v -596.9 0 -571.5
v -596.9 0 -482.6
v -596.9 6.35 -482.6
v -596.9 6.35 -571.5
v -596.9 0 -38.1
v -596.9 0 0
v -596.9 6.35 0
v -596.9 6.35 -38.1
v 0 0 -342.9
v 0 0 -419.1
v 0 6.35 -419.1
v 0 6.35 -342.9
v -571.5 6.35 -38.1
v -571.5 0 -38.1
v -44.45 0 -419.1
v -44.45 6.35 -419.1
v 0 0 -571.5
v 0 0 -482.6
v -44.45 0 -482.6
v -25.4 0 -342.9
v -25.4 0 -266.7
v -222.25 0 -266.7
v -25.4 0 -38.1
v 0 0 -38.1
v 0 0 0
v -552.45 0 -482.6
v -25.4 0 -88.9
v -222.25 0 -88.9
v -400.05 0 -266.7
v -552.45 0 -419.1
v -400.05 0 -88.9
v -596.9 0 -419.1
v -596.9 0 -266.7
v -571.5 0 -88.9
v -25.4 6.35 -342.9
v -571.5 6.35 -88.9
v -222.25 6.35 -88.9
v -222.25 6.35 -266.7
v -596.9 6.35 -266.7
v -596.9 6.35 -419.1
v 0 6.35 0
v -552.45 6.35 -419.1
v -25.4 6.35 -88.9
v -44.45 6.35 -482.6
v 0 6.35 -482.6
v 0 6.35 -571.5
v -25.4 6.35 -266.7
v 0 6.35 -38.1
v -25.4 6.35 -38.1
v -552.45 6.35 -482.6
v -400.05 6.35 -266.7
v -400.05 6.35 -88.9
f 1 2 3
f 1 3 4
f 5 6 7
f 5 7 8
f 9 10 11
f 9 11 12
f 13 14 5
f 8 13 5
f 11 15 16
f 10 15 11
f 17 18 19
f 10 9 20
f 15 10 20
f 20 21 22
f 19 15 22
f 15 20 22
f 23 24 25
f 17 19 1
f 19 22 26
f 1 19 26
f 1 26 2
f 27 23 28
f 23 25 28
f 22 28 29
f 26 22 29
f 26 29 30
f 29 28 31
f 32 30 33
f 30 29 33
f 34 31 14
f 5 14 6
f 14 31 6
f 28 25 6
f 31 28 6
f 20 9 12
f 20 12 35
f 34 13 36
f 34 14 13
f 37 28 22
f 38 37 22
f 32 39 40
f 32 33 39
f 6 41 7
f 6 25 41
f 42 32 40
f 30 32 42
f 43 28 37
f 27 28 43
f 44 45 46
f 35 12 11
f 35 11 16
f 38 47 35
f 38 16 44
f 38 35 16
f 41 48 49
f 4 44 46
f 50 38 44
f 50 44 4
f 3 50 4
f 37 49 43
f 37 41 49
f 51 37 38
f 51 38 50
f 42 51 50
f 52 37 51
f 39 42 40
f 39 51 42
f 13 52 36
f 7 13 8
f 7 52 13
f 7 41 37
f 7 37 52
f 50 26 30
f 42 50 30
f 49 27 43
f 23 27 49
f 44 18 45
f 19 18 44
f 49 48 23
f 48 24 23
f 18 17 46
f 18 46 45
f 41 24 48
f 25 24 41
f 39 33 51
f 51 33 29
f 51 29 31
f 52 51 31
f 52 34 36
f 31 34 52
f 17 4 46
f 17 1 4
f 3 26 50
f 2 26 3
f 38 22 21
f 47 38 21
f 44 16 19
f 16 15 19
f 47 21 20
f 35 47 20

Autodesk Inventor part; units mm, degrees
ref_plane "YZ Plane" through (0, 0, 0) normal (1, 0, 0) x (0, 1, 0)
ref_plane "XZ Plane" through (0, 0, 0) normal (0, 1, 0) x (-1, 0, 0)
ref_plane "XY Plane" through (0, 0, 0) normal (0, 0, 1) x (1, 0, 0)
sketch "Sketch1" plane through (0, 0, 0) normal (0, 1, 0) x (-1, 0, 0)
  line L0 (0, 0) -> (596.9, 0)
  line L1 (596.9, 0) -> (596.9, -571.5)
  line L2 (596.9, -571.5) -> (0, -571.5)
  line L3 (0, -571.5) -> (0, 0)
  line L4 (596.9, 0) -> (0, 0)
  line L5 (0, 0) -> (0, -38.1)
  line L6 (0, -38.1) -> (596.9, -38.1)
  line L7 (596.9, -38.1) -> (596.9, 0)
  line L8 (25.4, -38.1) -> (571.5, -38.1)
  line L9 (571.5, -38.1) -> (571.5, -88.9)
  line L10 (571.5, -88.9) -> (25.4, -88.9)
  line L11 (25.4, -88.9) -> (25.4, -38.1)
  line L12 (400.05, -88.9) -> (222.25, -88.9)
  line L13 (222.25, -88.9) -> (222.25, -266.7)
  line L14 (222.25, -266.7) -> (400.05, -266.7)
  line L15 (400.05, -266.7) -> (400.05, -88.9)
  line L16 (596.9, -266.7) -> (0, -266.7)
  line L17 (0, -266.7) -> (0, -342.9)
  line L18 (0, -342.9) -> (596.9, -342.9)
  line L19 (596.9, -342.9) -> (596.9, -266.7)
  line L20 (568.9457, -342.9) -> (52.0133, -342.9)
  line L21 (52.0133, -419.1) -> (568.9457, -419.1)
  line L22 (596.9, -419.1) -> (0, -419.1)
  line L23 (0, -419.1) -> (0, -571.5)
  line L24 (0, -571.5) -> (596.9, -571.5)
  line L25 (596.9, -571.5) -> (596.9, -419.1)
  line L26 (571.5, -266.7) -> (25.4, -266.7)
  line L27 (25.4, -266.7) -> (25.4, -342.9)
  line L28 (25.4, -342.9) -> (571.5, -342.9)
  line L29 (571.5, -342.9) -> (571.5, -266.7)
  line L30 (552.45, -419.1) -> (44.45, -419.1)
  line L31 (44.45, -419.1) -> (44.45, -508)
  line L32 (44.45, -508) -> (552.45, -508)
  line L33 (552.45, -508) -> (552.45, -419.1)
  line L34 (596.9, -571.5) -> (0, -571.5)
  line L35 (0, -571.5) -> (0, -482.6)
  line L36 (0, -482.6) -> (596.9, -482.6)
  line L37 (596.9, -482.6) -> (596.9, -571.5)
  dimension "d0" = 596.9
  dimension "d1" = 571.5
  dimension "d2" = 38.1
  dimension "d3" = 50.8
  dimension "d4" = 177.8
  dimension "d6" = 76.2
  dimension "d7" = 76.2
  dimension "d8" = 88.9
  dimension "d9" = 88.9
  dimension "d10" = 44.45
  dimension "d11" = 44.45
  dimension "d12" = 25.4
  dimension "d13" = 25.4
  dimension "d14" = 177.8
  dimension "d15" = 196.85
  dimension "d16" = 25.4
  dimension "d17" = 25.4
extrude "Extrusion1" add sketch "Sketch1" along normal blind 6.35 contours L0 L1 L6 L3 | L6 L9 L10 L11 | L1 L18 L29 L16 | L18 L1 L22 L21 L3 | L16 L14 L29 L18 L27 | L13 L10 L15 L14 | L36 L31 L32 L33 L1 L2 L3 | L22 L21 L33 L36 L31 | L36 L33 L32 L31
properties part number "ElectricalBoard.ver2-1111-2020"
